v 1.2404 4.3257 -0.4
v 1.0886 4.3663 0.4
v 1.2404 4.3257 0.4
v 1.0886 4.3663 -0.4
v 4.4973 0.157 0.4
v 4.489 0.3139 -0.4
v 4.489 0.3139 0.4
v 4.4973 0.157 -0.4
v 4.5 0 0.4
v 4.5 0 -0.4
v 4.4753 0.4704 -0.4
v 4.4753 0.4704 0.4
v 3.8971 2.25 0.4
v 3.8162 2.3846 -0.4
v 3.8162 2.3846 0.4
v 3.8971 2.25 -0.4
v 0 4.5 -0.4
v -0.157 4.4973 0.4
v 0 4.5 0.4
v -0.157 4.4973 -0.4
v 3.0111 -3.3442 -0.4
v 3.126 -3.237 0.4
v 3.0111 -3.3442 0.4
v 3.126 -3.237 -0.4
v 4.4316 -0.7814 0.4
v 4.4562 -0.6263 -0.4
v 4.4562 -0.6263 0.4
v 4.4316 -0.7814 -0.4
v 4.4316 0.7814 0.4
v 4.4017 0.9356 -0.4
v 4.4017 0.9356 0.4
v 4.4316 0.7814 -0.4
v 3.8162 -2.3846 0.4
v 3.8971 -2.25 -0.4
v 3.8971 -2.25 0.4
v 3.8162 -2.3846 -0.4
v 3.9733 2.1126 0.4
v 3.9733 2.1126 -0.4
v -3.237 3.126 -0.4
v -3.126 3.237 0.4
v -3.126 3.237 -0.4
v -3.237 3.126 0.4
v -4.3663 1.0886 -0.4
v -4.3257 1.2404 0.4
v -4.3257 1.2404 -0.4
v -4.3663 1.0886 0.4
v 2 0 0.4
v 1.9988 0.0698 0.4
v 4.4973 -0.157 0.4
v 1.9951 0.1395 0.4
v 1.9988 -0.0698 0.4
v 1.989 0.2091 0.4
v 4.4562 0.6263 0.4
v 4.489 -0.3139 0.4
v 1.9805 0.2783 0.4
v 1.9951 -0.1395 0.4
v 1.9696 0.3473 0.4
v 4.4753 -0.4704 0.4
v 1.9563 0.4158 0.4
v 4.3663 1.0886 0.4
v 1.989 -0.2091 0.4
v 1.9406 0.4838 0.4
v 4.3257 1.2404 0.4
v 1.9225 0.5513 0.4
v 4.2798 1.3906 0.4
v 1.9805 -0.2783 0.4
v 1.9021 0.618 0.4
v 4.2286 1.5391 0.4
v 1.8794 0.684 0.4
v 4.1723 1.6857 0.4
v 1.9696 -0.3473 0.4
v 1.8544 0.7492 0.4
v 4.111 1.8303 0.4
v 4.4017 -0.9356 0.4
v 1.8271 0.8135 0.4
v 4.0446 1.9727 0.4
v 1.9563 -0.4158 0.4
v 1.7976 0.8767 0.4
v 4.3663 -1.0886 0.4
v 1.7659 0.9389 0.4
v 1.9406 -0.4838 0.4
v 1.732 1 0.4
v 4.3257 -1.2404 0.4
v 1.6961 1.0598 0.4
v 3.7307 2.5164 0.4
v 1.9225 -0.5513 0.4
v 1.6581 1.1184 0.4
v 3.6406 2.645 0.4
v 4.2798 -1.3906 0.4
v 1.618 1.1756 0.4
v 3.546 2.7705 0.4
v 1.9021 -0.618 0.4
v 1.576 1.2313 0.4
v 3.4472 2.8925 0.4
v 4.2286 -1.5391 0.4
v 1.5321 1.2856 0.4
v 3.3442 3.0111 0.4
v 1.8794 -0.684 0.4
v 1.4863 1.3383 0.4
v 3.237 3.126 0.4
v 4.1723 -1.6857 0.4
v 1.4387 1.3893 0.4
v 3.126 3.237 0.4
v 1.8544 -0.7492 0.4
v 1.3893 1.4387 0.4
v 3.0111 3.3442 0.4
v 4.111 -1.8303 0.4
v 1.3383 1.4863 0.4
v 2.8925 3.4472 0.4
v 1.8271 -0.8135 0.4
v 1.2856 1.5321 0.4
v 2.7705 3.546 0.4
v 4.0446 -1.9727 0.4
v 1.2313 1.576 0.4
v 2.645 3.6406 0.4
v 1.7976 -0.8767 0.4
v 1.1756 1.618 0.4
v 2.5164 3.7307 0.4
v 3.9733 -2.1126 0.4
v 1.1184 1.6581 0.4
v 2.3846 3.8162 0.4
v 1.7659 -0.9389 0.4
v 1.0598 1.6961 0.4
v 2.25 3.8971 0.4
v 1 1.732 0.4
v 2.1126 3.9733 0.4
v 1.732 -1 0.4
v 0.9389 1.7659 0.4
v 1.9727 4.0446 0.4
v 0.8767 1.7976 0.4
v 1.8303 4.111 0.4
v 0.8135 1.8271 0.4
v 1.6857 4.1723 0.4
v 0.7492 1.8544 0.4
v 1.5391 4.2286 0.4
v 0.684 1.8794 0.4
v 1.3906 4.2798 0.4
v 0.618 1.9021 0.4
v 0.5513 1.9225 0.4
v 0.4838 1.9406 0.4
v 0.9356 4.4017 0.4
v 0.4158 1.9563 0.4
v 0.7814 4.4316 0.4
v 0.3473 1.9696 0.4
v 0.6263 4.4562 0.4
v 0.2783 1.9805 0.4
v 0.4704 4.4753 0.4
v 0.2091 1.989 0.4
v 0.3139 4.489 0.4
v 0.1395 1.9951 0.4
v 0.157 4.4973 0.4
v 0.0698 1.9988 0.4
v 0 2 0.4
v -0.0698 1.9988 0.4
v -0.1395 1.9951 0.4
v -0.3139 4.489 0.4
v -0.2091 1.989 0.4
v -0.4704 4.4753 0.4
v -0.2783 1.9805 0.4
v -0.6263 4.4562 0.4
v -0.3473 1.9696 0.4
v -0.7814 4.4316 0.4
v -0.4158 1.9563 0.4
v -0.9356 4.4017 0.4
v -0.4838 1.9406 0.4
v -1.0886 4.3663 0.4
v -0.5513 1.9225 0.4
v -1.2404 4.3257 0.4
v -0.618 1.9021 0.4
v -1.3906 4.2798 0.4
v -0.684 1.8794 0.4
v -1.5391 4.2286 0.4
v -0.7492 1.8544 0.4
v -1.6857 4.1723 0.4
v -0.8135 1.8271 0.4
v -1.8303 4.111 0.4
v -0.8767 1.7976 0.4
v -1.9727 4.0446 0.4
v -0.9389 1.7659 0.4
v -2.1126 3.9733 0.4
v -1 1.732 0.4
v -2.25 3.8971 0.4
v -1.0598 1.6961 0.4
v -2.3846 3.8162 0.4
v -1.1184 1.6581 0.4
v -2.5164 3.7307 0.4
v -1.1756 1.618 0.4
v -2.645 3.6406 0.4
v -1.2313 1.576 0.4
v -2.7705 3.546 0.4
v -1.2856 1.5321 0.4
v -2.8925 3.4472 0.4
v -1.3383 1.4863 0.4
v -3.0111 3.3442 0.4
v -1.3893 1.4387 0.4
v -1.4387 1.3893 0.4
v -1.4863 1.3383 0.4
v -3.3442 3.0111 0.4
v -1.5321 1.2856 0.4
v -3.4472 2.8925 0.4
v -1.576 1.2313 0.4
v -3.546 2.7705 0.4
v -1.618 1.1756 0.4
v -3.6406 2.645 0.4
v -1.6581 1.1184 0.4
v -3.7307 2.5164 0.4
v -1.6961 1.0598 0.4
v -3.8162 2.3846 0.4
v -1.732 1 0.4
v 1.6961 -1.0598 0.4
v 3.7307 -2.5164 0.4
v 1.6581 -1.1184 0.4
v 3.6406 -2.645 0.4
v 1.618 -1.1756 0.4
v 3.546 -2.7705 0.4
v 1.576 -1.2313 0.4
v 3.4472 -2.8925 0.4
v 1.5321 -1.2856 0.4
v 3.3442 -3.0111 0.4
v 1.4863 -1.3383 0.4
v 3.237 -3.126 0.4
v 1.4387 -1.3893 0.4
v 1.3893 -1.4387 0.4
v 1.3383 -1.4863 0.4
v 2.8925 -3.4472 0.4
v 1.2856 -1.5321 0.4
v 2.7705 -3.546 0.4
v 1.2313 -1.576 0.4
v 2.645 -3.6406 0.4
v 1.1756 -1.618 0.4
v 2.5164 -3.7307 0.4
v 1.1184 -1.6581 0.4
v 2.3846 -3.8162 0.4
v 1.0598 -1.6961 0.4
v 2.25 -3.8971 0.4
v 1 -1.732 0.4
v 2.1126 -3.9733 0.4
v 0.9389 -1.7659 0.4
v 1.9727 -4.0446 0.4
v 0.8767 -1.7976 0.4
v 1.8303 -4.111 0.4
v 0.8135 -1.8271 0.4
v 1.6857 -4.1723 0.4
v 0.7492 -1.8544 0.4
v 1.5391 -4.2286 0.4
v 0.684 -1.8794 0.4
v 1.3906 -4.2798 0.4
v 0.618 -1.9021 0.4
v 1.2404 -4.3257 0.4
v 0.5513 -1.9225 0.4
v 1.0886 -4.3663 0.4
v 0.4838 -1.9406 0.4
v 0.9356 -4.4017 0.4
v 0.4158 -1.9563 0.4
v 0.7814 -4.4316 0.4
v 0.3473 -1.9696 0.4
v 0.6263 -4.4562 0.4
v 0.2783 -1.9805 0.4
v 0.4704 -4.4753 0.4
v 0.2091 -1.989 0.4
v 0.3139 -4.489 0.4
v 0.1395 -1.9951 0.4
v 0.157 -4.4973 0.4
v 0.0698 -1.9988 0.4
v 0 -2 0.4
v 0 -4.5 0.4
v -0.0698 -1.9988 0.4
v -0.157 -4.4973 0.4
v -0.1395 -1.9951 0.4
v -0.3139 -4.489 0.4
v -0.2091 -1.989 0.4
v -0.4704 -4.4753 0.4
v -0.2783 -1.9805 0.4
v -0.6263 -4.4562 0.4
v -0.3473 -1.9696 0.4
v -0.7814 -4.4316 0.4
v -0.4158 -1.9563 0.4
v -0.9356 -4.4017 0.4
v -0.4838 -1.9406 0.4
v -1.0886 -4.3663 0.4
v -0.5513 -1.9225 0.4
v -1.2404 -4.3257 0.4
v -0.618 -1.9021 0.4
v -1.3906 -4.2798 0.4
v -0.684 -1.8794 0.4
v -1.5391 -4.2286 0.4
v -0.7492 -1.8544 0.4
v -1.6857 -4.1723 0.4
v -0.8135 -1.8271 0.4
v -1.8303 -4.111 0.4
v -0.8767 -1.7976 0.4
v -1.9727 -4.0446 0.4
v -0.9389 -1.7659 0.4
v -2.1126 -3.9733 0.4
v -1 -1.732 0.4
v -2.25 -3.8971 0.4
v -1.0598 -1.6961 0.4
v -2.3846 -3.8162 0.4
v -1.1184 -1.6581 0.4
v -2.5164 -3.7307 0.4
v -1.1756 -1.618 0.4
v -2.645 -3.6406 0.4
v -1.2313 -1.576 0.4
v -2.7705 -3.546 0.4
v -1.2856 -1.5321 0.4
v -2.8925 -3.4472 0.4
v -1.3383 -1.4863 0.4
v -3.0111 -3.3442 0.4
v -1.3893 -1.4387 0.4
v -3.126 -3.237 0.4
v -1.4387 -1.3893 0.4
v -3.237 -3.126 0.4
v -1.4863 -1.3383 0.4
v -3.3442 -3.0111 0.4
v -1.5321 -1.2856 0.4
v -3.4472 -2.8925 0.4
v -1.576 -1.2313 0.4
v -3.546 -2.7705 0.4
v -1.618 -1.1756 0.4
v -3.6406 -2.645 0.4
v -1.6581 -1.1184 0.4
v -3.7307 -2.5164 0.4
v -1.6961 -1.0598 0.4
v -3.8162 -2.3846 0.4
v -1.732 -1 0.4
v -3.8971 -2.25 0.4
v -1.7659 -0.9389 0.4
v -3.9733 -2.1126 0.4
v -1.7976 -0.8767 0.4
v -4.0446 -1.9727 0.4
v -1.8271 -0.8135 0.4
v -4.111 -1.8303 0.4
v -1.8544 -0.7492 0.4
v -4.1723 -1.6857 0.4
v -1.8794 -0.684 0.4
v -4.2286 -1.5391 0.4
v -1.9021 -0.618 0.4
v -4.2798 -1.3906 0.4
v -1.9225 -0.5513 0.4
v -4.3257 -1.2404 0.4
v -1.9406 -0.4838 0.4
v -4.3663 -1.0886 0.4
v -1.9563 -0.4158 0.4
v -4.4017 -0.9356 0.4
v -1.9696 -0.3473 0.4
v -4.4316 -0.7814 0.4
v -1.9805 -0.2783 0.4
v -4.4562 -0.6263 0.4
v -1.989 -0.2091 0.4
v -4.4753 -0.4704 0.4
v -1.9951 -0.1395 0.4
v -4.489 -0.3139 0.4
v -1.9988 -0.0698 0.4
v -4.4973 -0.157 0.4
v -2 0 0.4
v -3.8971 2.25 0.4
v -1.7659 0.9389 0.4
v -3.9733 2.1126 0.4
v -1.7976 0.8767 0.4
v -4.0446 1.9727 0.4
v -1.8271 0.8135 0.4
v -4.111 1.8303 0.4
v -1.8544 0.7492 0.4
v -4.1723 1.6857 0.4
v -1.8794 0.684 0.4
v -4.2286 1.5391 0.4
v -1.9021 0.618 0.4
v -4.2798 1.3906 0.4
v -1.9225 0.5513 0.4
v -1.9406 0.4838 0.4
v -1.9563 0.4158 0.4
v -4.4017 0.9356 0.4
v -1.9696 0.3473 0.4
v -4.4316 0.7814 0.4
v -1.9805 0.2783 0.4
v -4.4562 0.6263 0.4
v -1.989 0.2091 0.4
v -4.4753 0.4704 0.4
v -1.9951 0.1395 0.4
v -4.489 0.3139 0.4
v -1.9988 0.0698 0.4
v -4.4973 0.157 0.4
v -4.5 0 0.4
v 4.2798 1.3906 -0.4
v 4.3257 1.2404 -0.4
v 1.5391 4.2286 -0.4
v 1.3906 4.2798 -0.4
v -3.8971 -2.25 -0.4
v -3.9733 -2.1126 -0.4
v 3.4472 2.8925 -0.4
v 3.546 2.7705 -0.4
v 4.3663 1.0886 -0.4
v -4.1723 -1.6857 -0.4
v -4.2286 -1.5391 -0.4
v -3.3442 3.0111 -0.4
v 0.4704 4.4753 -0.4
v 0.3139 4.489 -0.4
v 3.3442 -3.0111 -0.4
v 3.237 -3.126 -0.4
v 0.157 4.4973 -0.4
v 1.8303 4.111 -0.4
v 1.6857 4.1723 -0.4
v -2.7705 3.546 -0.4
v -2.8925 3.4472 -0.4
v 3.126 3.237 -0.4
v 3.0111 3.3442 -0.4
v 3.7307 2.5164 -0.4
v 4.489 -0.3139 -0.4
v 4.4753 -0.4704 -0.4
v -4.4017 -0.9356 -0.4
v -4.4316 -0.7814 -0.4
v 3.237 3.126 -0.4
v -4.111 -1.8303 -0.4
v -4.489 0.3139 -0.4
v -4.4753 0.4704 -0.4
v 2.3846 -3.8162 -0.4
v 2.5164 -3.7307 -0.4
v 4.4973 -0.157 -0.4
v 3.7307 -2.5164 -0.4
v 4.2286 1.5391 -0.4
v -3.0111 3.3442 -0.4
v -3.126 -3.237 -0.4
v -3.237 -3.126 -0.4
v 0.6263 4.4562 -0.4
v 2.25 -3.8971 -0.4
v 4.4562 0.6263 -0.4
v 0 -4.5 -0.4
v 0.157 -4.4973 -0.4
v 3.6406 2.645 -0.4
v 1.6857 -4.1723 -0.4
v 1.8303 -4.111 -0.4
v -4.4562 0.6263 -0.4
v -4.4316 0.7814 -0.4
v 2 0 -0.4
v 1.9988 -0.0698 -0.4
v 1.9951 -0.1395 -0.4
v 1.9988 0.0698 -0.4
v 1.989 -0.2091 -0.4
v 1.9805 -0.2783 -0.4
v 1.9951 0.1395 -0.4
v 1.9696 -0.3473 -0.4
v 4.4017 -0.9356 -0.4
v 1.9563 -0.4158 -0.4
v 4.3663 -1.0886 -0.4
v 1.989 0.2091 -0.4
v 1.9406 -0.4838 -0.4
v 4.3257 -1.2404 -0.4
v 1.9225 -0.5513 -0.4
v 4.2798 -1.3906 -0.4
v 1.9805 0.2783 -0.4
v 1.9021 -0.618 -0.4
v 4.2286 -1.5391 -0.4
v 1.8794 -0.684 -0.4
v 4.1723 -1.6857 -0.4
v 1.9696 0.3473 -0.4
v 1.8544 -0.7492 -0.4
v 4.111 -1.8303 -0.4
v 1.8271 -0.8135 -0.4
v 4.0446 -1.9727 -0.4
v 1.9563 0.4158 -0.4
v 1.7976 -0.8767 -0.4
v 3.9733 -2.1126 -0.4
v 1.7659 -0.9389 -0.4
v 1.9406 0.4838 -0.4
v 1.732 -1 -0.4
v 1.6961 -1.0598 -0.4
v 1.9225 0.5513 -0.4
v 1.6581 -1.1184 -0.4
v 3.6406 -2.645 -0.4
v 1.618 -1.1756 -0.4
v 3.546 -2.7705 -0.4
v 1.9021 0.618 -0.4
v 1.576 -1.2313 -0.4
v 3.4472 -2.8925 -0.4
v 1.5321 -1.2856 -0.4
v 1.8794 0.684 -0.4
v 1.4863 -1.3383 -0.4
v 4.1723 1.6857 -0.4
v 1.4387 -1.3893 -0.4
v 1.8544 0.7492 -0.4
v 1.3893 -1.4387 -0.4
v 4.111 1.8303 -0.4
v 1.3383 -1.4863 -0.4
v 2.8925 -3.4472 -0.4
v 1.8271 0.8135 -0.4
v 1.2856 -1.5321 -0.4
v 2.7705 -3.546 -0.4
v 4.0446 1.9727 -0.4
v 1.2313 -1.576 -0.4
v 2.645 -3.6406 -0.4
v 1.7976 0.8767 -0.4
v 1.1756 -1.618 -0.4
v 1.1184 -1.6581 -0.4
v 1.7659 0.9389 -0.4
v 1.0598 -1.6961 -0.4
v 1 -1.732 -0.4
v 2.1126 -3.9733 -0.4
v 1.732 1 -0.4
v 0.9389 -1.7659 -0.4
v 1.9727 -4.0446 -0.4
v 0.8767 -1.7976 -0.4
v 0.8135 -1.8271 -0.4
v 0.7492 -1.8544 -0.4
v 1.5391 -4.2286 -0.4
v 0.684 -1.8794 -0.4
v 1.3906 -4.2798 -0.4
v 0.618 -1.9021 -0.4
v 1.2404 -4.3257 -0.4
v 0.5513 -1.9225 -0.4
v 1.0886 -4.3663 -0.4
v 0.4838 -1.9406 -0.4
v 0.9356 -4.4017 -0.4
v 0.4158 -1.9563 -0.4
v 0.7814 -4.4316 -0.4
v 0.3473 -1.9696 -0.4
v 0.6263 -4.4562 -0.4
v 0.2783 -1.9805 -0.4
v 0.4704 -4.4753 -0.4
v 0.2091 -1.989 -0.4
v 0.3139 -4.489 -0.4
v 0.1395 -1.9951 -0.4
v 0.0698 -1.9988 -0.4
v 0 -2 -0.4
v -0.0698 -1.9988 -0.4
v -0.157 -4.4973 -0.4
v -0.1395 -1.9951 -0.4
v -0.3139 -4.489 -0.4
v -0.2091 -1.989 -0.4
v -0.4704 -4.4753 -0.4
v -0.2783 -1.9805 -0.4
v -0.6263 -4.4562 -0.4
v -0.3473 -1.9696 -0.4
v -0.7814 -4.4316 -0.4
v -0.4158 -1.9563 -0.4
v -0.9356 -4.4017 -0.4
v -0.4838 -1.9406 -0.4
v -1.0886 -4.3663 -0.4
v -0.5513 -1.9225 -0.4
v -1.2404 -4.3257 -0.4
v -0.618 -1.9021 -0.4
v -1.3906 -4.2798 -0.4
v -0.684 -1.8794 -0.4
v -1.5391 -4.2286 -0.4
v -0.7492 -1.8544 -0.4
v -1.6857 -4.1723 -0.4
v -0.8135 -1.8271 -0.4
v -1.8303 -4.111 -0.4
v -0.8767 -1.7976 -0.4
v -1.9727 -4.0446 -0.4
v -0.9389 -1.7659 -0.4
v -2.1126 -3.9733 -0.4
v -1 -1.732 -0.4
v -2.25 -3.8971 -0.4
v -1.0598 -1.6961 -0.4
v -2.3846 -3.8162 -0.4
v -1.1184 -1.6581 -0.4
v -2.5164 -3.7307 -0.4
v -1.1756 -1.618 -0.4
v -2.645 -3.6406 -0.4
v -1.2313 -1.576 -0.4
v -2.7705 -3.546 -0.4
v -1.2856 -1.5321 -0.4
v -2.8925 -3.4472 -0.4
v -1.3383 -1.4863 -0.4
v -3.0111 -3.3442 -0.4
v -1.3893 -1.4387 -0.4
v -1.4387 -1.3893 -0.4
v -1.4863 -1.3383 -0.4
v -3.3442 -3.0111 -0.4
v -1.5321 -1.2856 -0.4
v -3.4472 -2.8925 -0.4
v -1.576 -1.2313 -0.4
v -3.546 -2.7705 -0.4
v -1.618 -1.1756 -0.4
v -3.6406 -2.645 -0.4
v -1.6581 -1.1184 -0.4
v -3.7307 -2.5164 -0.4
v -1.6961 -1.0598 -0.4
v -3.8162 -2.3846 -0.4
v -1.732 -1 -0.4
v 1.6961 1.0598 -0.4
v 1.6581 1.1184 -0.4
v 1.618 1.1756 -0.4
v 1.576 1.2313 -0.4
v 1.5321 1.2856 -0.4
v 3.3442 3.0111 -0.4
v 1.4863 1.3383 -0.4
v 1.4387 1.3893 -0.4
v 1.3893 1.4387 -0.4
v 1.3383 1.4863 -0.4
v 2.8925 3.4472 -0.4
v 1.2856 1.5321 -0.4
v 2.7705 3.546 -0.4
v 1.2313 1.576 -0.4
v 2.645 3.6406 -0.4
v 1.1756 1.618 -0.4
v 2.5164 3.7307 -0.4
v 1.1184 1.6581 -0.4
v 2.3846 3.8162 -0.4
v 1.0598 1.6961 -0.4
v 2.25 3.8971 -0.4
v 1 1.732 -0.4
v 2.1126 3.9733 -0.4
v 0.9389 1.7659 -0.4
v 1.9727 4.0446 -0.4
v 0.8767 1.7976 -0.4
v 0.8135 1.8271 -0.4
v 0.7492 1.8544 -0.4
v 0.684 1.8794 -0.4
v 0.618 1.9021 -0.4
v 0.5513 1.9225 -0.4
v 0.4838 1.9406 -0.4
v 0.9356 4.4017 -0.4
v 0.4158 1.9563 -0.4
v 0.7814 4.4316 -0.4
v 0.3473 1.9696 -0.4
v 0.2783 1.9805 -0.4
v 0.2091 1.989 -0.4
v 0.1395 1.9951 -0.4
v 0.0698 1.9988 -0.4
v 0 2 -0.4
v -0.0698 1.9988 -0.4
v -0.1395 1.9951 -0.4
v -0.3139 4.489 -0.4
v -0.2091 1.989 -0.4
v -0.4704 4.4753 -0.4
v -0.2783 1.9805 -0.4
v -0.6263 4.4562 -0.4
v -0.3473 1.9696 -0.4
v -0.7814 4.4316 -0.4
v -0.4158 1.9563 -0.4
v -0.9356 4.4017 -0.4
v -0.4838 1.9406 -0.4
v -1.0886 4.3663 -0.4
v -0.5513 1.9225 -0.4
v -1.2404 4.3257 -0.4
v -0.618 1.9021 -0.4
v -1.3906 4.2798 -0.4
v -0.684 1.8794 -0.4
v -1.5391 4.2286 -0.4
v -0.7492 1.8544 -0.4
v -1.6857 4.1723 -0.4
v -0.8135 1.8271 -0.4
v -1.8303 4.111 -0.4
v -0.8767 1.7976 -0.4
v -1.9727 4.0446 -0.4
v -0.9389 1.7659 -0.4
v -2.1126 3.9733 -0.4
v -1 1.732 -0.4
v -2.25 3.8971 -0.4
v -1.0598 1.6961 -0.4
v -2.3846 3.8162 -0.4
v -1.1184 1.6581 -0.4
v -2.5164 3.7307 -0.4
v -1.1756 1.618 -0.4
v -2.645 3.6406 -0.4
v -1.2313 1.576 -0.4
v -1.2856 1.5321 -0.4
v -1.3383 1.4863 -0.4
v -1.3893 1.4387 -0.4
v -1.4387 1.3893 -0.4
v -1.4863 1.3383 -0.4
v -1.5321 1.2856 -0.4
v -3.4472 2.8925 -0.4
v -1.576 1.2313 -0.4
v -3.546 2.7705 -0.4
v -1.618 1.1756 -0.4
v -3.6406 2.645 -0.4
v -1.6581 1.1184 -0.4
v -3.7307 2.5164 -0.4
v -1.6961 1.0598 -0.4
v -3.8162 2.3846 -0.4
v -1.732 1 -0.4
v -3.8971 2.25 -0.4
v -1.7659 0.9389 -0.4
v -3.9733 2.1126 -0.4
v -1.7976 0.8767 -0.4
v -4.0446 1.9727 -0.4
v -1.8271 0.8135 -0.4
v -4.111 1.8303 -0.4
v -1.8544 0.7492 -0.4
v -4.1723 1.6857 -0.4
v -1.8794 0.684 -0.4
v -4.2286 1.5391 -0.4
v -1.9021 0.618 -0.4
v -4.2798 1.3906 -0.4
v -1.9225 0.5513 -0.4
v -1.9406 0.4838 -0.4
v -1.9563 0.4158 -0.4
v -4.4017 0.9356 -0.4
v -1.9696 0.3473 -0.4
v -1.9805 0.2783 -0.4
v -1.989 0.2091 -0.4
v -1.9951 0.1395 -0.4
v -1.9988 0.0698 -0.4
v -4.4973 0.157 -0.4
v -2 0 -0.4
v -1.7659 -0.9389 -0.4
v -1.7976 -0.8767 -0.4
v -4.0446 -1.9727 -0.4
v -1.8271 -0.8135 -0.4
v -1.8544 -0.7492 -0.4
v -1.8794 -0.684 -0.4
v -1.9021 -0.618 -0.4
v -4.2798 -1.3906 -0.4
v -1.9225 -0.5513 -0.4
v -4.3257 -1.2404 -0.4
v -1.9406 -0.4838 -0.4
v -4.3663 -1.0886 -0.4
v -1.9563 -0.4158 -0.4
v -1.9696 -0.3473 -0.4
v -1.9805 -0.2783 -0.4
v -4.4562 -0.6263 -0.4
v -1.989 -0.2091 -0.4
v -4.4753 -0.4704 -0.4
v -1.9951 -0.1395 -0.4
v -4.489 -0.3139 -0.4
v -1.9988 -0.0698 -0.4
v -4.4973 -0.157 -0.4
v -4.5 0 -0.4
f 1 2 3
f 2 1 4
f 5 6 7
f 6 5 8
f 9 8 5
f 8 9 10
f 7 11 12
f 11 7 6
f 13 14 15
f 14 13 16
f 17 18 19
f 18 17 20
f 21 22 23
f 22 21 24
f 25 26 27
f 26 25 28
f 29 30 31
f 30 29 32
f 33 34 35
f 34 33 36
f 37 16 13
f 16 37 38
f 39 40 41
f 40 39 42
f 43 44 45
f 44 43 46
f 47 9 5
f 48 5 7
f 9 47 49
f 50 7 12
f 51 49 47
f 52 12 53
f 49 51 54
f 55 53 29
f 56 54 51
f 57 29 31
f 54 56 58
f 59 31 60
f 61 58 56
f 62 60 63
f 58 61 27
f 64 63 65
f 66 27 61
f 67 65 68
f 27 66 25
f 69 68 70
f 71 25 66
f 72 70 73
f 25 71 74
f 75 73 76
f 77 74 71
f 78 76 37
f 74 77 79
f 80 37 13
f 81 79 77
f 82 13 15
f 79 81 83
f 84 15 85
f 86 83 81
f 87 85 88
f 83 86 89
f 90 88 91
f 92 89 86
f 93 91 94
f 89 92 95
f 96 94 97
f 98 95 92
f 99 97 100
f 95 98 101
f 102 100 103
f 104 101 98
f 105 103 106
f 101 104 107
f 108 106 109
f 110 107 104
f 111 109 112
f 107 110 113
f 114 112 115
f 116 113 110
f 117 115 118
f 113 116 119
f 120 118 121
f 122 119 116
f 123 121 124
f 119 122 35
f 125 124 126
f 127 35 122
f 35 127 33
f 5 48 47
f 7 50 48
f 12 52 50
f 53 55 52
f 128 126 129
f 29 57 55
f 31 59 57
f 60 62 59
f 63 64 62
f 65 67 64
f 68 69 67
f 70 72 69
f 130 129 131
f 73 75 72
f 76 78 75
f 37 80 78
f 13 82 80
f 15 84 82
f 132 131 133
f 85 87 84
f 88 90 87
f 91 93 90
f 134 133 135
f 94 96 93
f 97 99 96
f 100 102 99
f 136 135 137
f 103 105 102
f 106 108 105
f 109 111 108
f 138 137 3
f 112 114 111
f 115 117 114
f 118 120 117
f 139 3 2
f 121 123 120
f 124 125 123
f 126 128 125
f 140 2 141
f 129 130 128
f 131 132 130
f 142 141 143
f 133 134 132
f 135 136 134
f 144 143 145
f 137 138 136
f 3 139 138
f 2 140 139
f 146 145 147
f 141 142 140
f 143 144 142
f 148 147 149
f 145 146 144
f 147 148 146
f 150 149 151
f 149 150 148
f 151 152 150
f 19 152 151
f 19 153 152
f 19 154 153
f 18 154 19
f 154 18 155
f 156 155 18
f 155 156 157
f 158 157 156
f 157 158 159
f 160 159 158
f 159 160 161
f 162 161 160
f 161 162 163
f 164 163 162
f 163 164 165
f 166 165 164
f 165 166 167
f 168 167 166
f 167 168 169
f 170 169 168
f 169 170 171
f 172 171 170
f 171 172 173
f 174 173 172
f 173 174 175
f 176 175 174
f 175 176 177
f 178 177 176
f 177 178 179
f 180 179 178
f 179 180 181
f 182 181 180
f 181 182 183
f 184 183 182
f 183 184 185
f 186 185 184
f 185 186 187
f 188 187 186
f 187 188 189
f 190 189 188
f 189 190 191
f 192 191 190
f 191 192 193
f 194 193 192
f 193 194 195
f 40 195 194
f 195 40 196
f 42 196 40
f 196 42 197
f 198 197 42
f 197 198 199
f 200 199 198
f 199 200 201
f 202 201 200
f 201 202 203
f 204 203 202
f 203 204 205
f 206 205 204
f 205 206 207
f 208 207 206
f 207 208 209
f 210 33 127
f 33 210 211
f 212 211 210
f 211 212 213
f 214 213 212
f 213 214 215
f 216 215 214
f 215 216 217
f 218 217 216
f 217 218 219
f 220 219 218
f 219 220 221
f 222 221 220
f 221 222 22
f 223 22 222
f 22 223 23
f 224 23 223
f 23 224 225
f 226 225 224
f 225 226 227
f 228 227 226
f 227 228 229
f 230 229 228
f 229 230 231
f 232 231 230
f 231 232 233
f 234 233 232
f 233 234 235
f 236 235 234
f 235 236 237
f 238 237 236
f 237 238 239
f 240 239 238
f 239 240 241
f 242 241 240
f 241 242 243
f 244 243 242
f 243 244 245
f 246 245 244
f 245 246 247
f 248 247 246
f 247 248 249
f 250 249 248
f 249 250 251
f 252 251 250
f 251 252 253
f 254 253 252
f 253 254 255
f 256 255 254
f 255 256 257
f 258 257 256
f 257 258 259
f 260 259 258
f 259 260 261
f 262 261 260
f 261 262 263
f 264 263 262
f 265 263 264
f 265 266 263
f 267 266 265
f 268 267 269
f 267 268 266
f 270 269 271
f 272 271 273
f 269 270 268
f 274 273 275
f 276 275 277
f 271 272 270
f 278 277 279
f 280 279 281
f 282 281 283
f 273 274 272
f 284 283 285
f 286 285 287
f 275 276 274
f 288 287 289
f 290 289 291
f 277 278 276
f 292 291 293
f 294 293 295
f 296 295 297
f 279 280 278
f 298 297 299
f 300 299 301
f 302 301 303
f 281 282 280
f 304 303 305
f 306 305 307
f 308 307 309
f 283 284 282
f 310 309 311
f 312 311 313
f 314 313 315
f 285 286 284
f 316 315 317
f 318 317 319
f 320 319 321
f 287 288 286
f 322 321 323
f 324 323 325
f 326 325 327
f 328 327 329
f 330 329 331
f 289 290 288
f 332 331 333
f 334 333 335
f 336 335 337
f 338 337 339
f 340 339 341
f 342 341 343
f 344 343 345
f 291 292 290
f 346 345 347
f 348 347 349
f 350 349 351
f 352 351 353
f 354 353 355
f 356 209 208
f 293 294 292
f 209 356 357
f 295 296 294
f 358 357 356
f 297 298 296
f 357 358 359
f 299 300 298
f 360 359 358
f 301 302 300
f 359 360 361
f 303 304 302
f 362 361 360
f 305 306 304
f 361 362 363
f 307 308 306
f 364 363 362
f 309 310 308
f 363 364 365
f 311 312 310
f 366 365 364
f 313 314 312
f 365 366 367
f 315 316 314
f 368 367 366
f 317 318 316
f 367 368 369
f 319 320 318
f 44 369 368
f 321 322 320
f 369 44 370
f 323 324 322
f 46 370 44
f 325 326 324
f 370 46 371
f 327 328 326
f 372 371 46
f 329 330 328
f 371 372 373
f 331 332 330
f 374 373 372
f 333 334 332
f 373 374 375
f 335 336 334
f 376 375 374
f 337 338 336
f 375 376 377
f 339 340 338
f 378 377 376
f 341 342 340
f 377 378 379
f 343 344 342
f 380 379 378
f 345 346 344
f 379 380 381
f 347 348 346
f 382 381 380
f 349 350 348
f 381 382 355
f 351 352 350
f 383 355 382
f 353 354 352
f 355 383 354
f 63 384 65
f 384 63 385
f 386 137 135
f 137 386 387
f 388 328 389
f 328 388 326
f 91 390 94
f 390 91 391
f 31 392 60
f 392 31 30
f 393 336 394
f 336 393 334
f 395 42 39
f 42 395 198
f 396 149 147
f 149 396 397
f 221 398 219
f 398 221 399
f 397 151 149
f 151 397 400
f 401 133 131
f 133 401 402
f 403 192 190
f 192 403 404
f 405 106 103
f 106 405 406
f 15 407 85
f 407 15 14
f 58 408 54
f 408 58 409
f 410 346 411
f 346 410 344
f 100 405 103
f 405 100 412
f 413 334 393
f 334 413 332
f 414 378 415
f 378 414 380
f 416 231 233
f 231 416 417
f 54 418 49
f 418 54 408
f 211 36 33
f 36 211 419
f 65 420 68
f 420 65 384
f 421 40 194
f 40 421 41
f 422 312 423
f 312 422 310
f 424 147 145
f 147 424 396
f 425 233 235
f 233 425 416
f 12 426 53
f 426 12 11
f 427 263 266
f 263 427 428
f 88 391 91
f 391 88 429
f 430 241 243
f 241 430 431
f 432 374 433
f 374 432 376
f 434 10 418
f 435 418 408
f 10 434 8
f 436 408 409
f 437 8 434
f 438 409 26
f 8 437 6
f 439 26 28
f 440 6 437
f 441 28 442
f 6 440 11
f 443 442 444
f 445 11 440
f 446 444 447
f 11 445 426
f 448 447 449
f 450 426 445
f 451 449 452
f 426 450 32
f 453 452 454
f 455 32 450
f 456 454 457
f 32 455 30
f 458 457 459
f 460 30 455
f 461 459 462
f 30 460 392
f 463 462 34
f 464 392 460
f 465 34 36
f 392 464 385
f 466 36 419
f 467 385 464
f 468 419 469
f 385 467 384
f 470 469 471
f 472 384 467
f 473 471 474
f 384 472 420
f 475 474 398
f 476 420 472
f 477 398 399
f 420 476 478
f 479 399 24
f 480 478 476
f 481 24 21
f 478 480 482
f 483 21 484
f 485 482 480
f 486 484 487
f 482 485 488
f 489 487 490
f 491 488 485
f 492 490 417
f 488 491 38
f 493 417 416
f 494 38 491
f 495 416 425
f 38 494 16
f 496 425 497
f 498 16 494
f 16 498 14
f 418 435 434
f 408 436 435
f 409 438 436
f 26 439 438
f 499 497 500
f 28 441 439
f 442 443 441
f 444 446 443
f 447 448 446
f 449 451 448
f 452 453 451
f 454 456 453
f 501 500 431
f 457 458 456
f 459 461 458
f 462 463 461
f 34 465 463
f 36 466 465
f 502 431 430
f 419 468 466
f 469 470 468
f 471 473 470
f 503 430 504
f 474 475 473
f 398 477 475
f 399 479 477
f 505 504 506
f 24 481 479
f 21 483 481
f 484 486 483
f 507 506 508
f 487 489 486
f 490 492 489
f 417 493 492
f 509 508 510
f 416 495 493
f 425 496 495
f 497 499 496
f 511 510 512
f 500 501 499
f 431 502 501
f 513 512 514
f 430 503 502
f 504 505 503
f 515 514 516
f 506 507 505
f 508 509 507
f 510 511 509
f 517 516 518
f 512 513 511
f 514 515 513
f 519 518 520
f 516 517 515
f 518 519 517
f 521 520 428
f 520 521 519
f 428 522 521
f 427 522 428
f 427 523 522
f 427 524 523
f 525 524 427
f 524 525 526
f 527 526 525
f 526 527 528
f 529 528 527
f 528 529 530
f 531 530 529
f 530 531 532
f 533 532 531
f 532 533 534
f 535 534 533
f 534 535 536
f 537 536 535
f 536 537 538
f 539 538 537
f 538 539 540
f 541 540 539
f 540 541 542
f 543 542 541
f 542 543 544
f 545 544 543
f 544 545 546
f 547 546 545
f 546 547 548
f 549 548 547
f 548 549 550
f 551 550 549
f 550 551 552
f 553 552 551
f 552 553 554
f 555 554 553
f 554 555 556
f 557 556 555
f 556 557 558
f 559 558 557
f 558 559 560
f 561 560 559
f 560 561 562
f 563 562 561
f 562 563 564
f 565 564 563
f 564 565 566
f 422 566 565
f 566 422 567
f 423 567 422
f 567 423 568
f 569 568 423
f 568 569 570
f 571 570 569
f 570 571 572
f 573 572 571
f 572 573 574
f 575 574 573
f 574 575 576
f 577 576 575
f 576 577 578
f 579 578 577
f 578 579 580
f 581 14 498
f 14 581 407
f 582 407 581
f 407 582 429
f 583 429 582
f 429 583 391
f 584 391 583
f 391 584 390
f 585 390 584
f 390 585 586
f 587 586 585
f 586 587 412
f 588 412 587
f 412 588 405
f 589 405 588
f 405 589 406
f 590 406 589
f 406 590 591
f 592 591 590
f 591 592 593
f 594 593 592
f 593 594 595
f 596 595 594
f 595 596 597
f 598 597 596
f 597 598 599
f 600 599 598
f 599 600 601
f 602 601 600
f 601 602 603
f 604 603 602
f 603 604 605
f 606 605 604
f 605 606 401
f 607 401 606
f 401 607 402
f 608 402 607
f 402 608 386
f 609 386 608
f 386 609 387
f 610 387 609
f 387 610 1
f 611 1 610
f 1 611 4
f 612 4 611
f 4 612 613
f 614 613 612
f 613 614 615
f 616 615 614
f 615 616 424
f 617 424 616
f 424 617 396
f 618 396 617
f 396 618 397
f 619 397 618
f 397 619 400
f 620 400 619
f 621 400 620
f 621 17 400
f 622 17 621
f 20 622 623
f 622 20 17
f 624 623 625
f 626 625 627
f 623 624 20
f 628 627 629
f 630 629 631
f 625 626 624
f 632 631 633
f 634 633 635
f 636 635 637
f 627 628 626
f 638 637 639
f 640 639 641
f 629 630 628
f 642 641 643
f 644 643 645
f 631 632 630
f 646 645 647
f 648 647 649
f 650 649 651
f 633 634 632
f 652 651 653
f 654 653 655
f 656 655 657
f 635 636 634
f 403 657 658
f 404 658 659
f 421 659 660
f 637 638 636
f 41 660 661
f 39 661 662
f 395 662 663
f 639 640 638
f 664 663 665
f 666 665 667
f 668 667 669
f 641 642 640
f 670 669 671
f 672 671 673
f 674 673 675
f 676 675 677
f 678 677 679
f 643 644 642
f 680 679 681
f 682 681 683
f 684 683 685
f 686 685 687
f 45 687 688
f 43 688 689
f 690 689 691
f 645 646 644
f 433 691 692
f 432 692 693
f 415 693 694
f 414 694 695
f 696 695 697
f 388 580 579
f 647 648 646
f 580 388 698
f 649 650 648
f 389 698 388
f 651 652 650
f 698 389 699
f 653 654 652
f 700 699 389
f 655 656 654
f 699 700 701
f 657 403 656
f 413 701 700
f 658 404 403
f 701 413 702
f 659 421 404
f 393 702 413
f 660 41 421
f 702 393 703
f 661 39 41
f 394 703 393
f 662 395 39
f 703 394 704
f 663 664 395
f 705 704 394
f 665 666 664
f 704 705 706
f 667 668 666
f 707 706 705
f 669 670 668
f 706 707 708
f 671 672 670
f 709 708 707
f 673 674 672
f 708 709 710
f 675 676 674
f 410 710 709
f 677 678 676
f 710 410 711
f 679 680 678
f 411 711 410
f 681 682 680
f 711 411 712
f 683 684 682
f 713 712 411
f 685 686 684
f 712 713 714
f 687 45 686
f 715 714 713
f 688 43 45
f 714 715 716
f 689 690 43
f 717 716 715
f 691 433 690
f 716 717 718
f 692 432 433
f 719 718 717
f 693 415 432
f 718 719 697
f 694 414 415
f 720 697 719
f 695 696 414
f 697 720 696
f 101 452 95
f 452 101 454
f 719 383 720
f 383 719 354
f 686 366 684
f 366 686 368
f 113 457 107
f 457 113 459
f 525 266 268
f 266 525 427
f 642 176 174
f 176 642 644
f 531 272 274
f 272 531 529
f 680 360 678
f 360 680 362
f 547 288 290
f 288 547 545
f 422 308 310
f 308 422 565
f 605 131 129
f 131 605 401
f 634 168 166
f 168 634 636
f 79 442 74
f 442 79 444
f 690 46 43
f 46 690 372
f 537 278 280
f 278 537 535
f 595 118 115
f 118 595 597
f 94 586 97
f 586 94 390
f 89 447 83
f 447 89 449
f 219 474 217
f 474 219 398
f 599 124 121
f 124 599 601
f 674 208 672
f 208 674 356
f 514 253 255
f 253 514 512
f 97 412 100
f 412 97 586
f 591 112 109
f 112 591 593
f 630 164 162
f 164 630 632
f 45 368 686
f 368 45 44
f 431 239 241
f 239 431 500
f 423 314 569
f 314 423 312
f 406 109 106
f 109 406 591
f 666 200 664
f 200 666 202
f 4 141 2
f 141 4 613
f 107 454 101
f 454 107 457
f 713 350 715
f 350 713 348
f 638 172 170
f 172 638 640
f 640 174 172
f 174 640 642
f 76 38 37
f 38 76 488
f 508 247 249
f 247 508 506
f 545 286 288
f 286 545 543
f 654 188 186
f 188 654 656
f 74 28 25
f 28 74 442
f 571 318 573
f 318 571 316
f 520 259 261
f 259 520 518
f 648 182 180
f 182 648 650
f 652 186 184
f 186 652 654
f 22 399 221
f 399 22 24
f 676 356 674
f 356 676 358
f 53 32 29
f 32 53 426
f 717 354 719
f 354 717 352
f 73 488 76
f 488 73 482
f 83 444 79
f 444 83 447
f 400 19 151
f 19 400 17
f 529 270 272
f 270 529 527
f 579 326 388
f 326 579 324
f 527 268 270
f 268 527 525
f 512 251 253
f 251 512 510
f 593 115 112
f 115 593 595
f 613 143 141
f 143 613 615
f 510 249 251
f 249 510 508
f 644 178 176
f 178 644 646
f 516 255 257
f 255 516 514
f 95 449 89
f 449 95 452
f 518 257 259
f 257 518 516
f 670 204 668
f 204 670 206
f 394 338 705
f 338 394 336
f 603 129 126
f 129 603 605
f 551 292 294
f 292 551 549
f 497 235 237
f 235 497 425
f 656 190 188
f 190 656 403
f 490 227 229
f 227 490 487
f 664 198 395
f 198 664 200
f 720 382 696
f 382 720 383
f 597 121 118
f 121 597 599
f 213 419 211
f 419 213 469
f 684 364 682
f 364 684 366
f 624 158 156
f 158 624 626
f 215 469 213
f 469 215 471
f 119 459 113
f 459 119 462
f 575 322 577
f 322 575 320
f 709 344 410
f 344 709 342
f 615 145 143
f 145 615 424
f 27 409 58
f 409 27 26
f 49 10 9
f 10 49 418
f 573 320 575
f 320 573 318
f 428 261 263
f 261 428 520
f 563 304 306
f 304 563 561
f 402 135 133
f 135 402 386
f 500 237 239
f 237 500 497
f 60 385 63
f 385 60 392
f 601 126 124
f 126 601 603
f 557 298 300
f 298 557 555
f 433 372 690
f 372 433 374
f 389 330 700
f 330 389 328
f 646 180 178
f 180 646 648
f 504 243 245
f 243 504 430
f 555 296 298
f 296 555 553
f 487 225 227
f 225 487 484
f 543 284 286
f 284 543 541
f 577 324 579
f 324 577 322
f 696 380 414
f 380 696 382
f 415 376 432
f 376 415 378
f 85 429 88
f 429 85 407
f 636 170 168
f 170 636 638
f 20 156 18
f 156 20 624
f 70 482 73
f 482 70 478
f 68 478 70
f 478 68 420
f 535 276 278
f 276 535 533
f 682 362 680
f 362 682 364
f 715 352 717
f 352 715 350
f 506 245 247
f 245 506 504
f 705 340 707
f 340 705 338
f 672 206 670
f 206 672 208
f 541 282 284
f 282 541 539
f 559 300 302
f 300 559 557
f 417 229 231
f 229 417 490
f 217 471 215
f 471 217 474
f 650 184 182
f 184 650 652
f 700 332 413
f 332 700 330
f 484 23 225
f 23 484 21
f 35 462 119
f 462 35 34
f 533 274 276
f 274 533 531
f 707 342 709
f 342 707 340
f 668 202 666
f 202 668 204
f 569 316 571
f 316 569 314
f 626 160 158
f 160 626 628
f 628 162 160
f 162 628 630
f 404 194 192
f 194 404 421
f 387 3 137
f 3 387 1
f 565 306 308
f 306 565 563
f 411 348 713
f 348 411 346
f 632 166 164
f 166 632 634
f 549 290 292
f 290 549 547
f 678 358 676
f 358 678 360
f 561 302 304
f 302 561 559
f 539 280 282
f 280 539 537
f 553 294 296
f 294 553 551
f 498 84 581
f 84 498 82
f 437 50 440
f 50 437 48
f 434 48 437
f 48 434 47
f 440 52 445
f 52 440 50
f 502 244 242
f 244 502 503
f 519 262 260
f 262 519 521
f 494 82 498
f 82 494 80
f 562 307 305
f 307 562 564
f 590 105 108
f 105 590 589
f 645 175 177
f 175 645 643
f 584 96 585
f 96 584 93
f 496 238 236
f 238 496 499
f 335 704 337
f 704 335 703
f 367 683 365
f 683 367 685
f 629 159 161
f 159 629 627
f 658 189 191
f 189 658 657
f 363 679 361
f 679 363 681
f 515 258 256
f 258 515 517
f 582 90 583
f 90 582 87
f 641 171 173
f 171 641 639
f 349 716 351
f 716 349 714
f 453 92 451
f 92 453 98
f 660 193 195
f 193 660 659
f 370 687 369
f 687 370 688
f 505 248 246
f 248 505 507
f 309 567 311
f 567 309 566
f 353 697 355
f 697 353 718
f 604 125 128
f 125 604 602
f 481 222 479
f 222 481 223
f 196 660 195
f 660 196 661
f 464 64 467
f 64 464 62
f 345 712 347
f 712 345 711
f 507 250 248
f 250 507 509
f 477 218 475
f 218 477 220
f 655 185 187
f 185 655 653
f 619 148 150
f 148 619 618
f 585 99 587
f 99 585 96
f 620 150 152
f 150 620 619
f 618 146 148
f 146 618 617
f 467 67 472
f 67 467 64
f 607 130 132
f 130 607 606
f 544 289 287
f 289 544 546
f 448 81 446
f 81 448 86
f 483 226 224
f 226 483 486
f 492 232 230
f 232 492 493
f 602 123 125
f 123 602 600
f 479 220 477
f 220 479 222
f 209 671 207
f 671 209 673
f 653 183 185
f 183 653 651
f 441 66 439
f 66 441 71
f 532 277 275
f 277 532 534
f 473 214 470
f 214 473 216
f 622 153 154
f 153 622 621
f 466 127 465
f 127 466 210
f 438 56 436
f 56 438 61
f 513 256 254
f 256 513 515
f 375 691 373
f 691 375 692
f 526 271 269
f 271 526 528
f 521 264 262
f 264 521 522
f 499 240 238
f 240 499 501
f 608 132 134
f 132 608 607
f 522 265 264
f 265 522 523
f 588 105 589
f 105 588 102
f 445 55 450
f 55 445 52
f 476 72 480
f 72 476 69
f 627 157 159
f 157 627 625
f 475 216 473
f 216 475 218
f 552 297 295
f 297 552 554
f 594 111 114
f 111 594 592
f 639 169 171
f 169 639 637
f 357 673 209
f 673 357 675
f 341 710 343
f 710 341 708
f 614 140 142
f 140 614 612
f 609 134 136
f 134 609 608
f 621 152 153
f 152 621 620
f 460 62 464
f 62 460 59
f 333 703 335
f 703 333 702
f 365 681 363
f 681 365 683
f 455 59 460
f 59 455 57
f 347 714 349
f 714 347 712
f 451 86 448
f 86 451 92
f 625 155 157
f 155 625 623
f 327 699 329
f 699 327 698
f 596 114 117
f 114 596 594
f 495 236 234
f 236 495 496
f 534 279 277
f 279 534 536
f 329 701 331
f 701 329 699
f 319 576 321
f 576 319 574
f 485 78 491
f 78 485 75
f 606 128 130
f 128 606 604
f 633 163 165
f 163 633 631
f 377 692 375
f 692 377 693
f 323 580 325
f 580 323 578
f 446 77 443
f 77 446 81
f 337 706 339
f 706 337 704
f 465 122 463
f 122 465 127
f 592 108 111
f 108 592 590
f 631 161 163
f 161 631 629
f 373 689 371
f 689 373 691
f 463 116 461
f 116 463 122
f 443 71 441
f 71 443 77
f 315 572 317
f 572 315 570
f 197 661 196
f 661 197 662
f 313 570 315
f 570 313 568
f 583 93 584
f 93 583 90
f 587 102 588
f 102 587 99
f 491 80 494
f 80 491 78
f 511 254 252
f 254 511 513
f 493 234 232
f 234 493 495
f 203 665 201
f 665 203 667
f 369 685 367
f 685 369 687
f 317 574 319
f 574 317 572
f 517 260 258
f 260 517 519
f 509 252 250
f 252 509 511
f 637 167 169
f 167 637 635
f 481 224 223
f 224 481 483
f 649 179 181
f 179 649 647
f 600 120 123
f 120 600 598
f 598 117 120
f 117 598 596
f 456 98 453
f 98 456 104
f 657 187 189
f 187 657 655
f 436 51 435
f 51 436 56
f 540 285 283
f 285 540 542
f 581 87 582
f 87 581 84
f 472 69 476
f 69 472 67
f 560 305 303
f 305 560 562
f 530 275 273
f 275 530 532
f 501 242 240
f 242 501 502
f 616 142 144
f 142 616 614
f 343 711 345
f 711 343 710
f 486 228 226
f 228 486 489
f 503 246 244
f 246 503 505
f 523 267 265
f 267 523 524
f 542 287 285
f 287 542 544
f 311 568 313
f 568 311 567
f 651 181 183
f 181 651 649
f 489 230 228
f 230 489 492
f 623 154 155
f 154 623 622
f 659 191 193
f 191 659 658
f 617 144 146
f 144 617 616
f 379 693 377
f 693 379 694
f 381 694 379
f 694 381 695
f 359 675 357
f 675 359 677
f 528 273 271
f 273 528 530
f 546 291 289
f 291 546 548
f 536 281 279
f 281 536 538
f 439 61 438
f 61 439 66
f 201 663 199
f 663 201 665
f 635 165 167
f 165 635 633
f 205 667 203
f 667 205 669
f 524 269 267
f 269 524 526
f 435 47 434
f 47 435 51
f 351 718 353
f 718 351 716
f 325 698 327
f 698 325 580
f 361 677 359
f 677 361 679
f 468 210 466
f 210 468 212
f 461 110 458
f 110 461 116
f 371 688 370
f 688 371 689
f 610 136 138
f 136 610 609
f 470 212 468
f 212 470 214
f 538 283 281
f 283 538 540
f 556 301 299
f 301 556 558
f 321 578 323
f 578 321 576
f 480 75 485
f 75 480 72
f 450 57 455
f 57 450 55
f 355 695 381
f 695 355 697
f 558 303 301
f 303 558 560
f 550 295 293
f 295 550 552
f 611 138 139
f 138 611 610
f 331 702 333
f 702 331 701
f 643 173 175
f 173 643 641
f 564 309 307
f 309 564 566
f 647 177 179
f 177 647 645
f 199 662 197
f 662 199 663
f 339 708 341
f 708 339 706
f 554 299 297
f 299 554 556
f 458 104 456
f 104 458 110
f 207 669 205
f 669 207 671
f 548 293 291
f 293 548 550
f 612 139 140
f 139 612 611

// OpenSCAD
// Flat washer: 4.0mm ID, 9.0mm OD, 0.8mm thickness

id = 4.0;        // inner diameter (mm)
od = 9.0;        // outer diameter (mm)
thickness = 0.8; // thickness (mm)

$fn = 180;       // smooth circular edges

module washer(id, od, thickness) {
    difference() {
        cylinder(h=thickness, r=od/2, center=true);
        cylinder(h=thickness + 0.2, r=id/2, center=true); // slight extra to guarantee clean cut
    }
}

washer(id, od, thickness);
